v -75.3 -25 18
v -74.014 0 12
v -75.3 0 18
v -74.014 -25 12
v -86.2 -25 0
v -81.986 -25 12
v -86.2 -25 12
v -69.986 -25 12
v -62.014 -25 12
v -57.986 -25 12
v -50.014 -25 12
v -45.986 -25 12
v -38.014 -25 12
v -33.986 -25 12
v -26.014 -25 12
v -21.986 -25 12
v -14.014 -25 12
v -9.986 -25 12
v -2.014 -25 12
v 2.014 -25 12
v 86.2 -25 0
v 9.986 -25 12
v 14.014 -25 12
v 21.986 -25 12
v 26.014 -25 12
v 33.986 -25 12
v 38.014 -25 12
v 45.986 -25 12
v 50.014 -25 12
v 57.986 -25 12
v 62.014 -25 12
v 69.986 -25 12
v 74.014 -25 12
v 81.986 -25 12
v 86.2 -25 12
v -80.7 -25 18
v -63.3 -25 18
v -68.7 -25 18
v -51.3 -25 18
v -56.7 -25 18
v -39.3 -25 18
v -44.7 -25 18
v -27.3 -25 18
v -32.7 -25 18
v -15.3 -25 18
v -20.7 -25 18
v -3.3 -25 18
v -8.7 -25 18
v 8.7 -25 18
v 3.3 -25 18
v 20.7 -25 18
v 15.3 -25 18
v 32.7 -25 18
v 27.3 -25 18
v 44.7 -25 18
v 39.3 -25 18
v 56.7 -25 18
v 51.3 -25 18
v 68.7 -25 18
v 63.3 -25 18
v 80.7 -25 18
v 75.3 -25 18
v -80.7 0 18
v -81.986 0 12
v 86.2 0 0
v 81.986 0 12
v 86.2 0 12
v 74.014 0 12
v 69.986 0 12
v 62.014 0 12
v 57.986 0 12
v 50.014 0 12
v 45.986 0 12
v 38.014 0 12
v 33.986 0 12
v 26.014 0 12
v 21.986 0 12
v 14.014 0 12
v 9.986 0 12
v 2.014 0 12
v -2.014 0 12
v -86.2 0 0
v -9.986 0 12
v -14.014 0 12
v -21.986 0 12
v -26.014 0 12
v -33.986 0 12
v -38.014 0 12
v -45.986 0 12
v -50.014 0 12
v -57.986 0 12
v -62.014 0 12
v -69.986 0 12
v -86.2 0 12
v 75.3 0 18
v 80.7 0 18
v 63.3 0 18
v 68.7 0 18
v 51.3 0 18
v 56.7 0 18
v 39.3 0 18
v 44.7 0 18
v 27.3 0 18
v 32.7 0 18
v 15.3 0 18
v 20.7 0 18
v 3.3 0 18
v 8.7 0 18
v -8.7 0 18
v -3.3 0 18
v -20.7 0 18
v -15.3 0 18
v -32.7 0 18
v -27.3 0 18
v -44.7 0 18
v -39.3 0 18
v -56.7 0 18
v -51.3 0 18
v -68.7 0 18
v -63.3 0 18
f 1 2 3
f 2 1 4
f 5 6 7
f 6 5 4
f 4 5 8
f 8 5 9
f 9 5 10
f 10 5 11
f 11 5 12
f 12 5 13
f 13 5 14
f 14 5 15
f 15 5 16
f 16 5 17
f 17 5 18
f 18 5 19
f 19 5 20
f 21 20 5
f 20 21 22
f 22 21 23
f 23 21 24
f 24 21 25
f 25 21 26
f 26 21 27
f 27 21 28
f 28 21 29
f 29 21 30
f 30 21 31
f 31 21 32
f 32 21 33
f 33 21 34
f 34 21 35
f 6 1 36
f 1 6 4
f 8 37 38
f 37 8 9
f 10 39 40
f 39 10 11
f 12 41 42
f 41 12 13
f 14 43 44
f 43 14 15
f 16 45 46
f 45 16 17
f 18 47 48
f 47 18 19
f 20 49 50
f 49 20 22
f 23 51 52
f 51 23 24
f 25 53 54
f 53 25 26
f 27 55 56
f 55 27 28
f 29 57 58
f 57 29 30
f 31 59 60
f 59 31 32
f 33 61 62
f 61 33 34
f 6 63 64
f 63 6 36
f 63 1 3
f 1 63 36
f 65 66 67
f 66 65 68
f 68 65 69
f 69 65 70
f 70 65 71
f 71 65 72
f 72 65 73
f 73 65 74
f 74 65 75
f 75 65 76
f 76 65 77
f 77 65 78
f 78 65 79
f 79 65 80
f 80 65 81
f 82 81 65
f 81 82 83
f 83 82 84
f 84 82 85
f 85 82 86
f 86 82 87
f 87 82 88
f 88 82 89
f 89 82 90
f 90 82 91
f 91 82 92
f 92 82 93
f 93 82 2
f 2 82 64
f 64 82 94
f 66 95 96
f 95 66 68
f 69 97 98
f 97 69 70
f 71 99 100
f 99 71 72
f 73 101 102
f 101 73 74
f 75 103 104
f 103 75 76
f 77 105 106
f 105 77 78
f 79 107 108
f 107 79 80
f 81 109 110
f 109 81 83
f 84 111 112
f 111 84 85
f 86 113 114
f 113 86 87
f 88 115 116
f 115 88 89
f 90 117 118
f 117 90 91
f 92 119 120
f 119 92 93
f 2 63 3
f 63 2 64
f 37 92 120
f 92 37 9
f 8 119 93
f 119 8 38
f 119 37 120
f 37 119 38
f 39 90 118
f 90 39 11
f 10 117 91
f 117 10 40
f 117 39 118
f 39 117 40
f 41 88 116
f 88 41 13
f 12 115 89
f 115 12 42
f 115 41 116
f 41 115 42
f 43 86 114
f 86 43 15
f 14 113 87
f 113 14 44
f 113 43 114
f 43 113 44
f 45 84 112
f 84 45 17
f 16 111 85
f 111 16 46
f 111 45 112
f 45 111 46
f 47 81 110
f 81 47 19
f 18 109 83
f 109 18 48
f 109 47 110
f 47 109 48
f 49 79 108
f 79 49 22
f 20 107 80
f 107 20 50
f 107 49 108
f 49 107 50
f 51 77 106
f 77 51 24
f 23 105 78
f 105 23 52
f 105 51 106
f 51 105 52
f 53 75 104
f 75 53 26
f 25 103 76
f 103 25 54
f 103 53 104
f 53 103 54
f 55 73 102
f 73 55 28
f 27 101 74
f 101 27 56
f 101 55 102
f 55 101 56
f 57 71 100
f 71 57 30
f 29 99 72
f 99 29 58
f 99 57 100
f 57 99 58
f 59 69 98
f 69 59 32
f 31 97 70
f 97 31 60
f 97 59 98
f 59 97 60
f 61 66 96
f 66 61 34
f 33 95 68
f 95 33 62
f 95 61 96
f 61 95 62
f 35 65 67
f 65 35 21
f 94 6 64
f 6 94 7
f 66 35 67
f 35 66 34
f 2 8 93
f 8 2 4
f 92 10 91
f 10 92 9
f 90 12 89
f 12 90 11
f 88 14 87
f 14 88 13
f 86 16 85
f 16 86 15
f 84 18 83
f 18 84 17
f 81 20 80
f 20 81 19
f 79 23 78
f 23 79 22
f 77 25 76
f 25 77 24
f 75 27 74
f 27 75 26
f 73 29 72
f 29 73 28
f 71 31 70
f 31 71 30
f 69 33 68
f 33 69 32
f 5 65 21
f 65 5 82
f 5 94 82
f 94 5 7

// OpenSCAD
$fn = 32;

// ----------------------------------------------------------------------
// Toothed rack, 14 teeth
// 12 mm pitch, 6 mm teeth
// ----------------------------------------------------------------------

// --- parameters (mm) ---
bar_w = 25;     // bar width (Y)
bar_h = 12;     // bar height (Z)
teeth = 14;     // number of teeth
pitch = 12;     // tooth pitch
tooth_h = 6;    // tooth height above the bar
root_w = 8.4;   // tooth width at the root
crest_w = 5.4;  // tooth width at the crest

// --- derived feature positions (mm) ---
span = (teeth - 1) * pitch;  // = 156   distance between the outer teeth
bar_l = span + root_w + 8;   // = 172.4   bar length: teeth plus 4 mm at each end
tooth_x = -span / 2;         // = -78   X of the first tooth
height = bar_h + tooth_h;    // = 18   overall height
feature_centers = [
  [tooth_x + 0 * pitch, -bar_w / 2],
  [tooth_x + 1 * pitch, -bar_w / 2],
  [tooth_x + 2 * pitch, -bar_w / 2],
  [tooth_x + 3 * pitch, -bar_w / 2],
  [tooth_x + 4 * pitch, -bar_w / 2],
  [tooth_x + 5 * pitch, -bar_w / 2],
  [tooth_x + 6 * pitch, -bar_w / 2],
  [tooth_x + 7 * pitch, -bar_w / 2],
  [tooth_x + 8 * pitch, -bar_w / 2],
  [tooth_x + 9 * pitch, -bar_w / 2],
  [tooth_x + 10 * pitch, -bar_w / 2],
  [tooth_x + 11 * pitch, -bar_w / 2],
  [tooth_x + 12 * pitch, -bar_w / 2],
  [tooth_x + 13 * pitch, -bar_w / 2]
];   // tooth centre line, drives the tooth loop

// bar with a rack of teeth, one extruded trapezoium per centre
module rack_tooth() {
  linear_extrude(height = bar_w)
    polygon(points = [
      [0, 0],
      [root_w, 0],
      [root_w / 2 + crest_w / 2, tooth_h + 1],
      [root_w / 2 - crest_w / 2, tooth_h + 1]
    ]);
}

union() {
  translate([-bar_l / 2, -bar_w, 0]) cube([bar_l, bar_w, bar_h]);
  for (centre = feature_centers)
    translate([centre[0] - root_w / 2, 0, bar_h - 1]) rotate([90, 0, 0]) rack_tooth();
}
